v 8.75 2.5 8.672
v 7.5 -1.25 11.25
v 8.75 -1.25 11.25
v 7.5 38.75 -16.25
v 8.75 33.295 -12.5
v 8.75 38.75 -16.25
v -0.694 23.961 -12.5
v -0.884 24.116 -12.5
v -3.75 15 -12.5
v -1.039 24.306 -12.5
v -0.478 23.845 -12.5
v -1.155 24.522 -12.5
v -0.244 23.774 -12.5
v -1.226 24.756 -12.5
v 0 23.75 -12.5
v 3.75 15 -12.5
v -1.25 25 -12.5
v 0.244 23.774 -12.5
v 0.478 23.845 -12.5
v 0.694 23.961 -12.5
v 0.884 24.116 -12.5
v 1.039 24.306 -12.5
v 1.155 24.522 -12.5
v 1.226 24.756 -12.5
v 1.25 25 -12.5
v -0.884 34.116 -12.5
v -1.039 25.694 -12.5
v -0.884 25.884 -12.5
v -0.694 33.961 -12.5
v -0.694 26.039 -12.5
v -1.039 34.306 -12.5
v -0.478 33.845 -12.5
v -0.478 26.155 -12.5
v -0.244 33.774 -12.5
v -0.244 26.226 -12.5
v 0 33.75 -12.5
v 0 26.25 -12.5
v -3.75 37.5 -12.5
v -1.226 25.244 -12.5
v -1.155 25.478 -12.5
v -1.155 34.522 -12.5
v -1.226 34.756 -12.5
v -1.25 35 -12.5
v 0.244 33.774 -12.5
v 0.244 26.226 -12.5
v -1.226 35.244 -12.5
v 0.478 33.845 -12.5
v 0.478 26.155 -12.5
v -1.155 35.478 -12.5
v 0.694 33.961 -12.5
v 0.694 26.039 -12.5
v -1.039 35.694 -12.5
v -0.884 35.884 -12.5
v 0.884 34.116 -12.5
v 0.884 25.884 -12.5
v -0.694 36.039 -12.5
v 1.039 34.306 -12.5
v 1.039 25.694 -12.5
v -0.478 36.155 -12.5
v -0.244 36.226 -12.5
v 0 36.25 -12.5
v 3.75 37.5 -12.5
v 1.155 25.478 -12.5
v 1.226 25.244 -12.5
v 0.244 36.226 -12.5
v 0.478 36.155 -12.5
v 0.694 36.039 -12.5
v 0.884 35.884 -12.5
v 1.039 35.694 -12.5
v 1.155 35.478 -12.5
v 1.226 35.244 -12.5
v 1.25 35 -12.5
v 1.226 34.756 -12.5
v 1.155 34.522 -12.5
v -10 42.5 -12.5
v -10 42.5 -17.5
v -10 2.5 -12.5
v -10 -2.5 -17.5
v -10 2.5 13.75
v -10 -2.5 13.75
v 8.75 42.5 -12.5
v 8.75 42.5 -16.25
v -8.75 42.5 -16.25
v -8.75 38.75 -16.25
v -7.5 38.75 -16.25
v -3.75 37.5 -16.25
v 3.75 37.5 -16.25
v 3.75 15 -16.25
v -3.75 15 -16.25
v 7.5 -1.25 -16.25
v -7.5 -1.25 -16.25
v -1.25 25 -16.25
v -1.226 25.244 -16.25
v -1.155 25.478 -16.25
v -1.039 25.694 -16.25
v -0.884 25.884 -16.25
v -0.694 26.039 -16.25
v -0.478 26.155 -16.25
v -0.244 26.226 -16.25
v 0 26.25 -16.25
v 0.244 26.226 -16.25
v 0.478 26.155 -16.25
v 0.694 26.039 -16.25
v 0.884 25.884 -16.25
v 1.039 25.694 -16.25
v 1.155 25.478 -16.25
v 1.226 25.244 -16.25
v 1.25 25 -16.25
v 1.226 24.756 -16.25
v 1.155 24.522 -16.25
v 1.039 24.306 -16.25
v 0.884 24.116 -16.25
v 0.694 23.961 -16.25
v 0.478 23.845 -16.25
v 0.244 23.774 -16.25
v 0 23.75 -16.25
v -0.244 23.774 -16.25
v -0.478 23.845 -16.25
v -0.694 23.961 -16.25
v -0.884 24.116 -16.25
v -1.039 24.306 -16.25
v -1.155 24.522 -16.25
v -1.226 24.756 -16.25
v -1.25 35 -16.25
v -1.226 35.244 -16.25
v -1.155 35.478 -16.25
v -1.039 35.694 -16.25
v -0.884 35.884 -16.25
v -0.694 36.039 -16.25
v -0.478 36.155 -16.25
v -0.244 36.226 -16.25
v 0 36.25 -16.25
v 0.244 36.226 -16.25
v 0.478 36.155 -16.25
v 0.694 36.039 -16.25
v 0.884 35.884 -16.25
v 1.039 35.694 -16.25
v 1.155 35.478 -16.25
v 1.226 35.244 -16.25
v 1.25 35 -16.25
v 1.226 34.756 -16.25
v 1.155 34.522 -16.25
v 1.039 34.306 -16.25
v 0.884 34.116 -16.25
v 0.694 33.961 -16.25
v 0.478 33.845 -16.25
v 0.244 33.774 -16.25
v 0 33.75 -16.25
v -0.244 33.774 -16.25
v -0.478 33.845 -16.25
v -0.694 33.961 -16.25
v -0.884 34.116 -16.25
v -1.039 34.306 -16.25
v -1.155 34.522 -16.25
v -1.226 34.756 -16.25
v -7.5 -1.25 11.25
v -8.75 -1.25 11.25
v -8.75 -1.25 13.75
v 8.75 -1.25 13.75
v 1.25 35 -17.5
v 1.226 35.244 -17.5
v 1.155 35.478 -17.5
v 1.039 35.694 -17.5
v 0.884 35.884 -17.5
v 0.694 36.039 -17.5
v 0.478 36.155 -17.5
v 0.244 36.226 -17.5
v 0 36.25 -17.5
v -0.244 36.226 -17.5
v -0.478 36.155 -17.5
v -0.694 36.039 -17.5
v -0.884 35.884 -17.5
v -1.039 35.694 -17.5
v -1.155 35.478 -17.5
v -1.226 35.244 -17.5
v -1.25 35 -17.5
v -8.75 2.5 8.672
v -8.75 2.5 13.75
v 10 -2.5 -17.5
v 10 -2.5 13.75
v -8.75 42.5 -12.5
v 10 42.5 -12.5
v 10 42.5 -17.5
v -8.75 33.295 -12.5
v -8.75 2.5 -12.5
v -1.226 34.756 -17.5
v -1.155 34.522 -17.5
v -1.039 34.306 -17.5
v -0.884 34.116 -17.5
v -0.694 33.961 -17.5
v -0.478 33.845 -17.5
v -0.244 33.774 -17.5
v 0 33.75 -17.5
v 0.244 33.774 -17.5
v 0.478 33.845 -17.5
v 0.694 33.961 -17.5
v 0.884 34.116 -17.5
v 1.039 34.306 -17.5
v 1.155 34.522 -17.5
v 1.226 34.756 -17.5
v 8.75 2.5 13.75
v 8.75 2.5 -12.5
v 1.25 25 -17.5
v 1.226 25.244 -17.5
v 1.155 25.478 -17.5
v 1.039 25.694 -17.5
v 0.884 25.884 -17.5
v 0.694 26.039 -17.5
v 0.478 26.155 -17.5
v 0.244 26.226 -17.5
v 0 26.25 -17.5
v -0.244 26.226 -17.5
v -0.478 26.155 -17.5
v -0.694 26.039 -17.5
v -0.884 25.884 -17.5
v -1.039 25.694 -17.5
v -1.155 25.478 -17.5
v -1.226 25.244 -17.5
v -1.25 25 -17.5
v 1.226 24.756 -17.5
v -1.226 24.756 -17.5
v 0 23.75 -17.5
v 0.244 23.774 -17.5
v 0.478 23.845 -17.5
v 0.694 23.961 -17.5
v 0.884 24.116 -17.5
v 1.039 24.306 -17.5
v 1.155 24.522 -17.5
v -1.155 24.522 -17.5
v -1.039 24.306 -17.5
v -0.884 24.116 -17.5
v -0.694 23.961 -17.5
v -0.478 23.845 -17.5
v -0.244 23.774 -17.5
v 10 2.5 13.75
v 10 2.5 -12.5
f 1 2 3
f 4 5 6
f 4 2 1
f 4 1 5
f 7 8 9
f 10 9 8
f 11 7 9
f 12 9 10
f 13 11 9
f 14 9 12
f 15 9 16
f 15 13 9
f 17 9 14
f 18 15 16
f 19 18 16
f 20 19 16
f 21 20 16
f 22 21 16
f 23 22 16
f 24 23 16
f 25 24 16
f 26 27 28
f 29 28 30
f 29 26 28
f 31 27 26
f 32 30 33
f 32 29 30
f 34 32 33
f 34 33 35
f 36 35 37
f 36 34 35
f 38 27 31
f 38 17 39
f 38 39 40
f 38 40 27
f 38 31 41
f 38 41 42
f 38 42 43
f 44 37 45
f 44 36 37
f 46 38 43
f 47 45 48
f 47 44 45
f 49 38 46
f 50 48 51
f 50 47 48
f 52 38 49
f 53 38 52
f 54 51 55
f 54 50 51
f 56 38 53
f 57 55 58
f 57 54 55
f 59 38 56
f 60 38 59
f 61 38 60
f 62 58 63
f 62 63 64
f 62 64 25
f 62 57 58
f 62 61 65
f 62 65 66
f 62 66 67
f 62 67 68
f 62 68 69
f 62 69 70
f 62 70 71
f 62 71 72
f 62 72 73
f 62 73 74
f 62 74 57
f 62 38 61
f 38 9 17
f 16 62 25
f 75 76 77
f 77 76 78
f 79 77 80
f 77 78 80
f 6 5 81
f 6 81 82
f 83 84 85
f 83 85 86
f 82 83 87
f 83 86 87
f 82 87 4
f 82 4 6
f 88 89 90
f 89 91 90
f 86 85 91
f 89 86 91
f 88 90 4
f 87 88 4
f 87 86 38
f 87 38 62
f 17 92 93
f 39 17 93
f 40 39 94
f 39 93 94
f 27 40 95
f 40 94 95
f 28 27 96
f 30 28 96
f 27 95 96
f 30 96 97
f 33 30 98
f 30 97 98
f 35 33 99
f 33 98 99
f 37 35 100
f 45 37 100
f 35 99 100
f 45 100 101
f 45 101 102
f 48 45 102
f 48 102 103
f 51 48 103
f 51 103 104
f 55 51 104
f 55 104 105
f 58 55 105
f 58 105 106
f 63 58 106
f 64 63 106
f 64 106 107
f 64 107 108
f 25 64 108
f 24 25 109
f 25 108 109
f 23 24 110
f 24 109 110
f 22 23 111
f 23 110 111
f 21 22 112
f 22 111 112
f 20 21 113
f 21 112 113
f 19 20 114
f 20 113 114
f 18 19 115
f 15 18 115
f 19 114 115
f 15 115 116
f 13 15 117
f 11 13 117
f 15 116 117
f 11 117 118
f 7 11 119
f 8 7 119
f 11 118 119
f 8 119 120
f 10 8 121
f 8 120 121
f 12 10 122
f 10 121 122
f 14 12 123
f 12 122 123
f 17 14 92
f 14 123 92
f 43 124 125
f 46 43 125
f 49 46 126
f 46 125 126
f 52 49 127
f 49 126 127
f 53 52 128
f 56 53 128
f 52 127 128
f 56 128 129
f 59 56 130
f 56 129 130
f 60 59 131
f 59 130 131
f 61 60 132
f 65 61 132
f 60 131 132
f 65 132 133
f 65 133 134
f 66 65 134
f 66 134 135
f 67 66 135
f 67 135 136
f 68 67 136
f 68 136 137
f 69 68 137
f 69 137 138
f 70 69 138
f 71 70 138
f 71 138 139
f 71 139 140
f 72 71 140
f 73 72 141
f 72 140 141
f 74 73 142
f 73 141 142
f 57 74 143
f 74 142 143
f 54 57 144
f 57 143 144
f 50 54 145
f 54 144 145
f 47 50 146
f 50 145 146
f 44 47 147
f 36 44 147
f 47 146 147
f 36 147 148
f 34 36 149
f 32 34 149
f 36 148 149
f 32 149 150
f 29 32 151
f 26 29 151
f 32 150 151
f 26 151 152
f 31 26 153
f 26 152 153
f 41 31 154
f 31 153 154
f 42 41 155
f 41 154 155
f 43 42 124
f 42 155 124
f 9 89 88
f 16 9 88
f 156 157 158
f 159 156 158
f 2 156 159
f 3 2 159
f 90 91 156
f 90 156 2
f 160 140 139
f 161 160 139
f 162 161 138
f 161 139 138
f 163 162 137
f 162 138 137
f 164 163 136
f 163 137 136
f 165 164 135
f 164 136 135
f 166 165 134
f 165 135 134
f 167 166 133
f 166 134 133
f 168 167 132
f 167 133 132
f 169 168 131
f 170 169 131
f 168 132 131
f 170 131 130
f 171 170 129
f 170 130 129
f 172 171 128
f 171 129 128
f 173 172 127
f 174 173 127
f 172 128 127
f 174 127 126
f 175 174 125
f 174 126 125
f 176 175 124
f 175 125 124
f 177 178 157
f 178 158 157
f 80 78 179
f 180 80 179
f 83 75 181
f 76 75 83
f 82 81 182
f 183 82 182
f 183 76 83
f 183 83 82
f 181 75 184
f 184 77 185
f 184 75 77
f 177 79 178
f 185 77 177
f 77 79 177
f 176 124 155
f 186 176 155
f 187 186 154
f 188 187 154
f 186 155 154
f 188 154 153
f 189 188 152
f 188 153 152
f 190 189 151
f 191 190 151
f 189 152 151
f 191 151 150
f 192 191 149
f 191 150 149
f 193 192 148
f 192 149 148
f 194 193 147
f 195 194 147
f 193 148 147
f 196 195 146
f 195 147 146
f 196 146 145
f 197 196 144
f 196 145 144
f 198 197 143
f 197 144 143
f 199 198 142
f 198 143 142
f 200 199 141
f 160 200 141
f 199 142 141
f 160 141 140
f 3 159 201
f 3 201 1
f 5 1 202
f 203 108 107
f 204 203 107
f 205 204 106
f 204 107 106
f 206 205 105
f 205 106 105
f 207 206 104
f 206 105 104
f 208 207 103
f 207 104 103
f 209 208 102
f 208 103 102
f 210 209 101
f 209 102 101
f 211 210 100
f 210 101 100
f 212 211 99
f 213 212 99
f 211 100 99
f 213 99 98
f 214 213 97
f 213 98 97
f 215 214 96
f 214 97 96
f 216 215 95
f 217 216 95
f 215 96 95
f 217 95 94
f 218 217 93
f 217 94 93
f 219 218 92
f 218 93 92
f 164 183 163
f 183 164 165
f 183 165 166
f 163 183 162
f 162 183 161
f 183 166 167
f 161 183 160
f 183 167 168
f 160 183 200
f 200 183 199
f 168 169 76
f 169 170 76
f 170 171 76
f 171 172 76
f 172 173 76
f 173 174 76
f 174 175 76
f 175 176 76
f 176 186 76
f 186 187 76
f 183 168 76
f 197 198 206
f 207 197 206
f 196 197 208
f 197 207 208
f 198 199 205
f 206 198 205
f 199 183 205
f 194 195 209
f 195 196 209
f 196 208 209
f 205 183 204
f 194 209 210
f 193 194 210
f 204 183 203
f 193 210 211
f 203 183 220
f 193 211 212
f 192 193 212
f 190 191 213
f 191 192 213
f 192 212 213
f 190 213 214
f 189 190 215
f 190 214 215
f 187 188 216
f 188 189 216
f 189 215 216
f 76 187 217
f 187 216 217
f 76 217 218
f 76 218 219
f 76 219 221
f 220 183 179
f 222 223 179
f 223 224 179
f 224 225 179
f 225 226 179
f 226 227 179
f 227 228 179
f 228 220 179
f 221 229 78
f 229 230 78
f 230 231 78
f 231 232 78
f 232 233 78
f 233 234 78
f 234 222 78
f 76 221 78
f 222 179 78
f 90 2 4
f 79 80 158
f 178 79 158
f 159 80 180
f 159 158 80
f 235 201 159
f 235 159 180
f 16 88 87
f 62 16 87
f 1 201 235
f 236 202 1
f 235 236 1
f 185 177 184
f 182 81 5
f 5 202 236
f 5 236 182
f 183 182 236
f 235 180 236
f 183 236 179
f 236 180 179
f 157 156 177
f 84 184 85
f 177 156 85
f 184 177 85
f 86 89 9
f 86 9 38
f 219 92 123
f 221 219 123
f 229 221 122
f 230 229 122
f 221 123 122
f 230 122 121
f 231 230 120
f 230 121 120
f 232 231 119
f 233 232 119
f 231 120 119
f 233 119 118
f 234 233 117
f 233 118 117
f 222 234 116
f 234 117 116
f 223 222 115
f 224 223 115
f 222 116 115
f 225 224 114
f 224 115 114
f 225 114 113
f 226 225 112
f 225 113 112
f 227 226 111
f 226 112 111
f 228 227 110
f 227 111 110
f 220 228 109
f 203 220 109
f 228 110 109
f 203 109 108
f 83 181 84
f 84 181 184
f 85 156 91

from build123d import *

# Parameters (mm, degrees)
SKETCH1_W               = 20
SKETCH1_H               = 31.25
BOSS_EXTRUDE1_DEPTH     = 2.5
CUT_EXTRUDE1_DEPTH      = 3.75
BOSS_EXTRUDE2_DEPTH     = 40
SKETCH4_W               = 1.25
SKETCH4_H               = 27.5
BOSS_EXTRUDE3_DEPTH     = 40
CUT_EXTRUDE5_DEPTH      = 16.25
CUT_EXTRUDE5_DEPTH_BACK = 1.25
SKETCH10_R              = 1.25
CUT_EXTRUDE6_DEPTH      = 45.75
CUT_EXTRUDE6_DEPTH_BACK = 2.25
SKETCH11_W              = 7.5
SKETCH11_H              = 22.5
BOSS_EXTRUDE4_DEPTH     = 3.75
SKETCH12_R              = 1.25
CUT_EXTRUDE7_DEPTH      = 13.75


with BuildPart() as part:
    # Sketch1 → Boss-Extrude1 (new body, symmetric)
    with BuildSketch(Plane(origin=(0, 0, 0), x_dir=(1, 0, 0), z_dir=(0, 1, 0))):
        with Locations((0, 1.875)):
            Rectangle(SKETCH1_W, SKETCH1_H)
    extrude(amount=BOSS_EXTRUDE1_DEPTH, both=True)

    # Sketch2 → Cut-Extrude1 (cut)
    with BuildSketch(Plane(origin=(0, 2.5, 0), x_dir=(1, 0, 0), z_dir=(0, 1, 0))):
        Polygon((-8.75, -12.5), (-8.75, -13.75), (8.75, -13.75), (8.75, -12.5), (8.75, 16.25), (-8.75, 16.25), align=None)
    extrude(amount=-CUT_EXTRUDE1_DEPTH, mode=Mode.SUBTRACT)

    # Sketch3 → Boss-Extrude2 (add)
    with BuildSketch(Plane(origin=(0, 2.5, 0), x_dir=(1, 0, 0), z_dir=(0, 1, 0))):
        Polygon((-8.75, 16.25), (-8.736970705, 16.25), (8.75, 16.25), (8.75, 12.5), (10, 12.5), (10, 17.5), (-8.732627572, 17.5), (-10, 17.5), (-10, 12.5), (-8.75, 12.5), align=None)
    extrude(amount=BOSS_EXTRUDE2_DEPTH)

    # Sketch4 → Boss-Extrude3 (add)
    with BuildSketch(Plane(origin=(0, -1.25, 0), x_dir=(1, 0, 0), z_dir=(0, 1, 0))):
        with Locations((8.125, 2.5)):
            Rectangle(SKETCH4_W, SKETCH4_H)
        with Locations((-8.125, 2.5)):
            Rectangle(SKETCH4_W, SKETCH4_H)
    extrude(amount=BOSS_EXTRUDE3_DEPTH)

    # Sketch7 → Cut-Extrude5 (cut, two sides)
    with BuildSketch(Plane.ZY.offset(-7.5)) as cut_extrude5_sk:
        Polygon((-16.25, 38.75), (11.25, 38.75), (11.25, -1.25), align=None)
    extrude(amount=CUT_EXTRUDE5_DEPTH, mode=Mode.SUBTRACT)
    extrude(cut_extrude5_sk.sketch, amount=-CUT_EXTRUDE5_DEPTH_BACK, mode=Mode.SUBTRACT)

    # Sketch10 → Cut-Extrude6 (cut, two sides)
    with BuildSketch(Plane.XY.offset(-16.25)) as cut_extrude6_sk:
        with Locations((0, 35)):
            Circle(SKETCH10_R)
        with Locations((0, 25)):
            Circle(SKETCH10_R)
    extrude(amount=CUT_EXTRUDE6_DEPTH, mode=Mode.SUBTRACT)
    extrude(cut_extrude6_sk.sketch, amount=-CUT_EXTRUDE6_DEPTH_BACK, mode=Mode.SUBTRACT)

    # Sketch11 → Boss-Extrude4 (add)
    with BuildSketch(Plane.XY.offset(-16.25)):
        with Locations((0, 26.25)):
            Rectangle(SKETCH11_W, SKETCH11_H)
    extrude(amount=BOSS_EXTRUDE4_DEPTH)

    # Sketch12 → Cut-Extrude7 (cut)
    with BuildSketch(Plane(origin=(0, 0, -17.5), x_dir=(-1, 0, 0), z_dir=(0, 0, -1))):
        with Locations((0, 35)):
            Circle(SKETCH12_R)
        with Locations((0, 25)):
            Circle(SKETCH12_R)
    extrude(amount=-CUT_EXTRUDE7_DEPTH, mode=Mode.SUBTRACT)


solid = part.part
